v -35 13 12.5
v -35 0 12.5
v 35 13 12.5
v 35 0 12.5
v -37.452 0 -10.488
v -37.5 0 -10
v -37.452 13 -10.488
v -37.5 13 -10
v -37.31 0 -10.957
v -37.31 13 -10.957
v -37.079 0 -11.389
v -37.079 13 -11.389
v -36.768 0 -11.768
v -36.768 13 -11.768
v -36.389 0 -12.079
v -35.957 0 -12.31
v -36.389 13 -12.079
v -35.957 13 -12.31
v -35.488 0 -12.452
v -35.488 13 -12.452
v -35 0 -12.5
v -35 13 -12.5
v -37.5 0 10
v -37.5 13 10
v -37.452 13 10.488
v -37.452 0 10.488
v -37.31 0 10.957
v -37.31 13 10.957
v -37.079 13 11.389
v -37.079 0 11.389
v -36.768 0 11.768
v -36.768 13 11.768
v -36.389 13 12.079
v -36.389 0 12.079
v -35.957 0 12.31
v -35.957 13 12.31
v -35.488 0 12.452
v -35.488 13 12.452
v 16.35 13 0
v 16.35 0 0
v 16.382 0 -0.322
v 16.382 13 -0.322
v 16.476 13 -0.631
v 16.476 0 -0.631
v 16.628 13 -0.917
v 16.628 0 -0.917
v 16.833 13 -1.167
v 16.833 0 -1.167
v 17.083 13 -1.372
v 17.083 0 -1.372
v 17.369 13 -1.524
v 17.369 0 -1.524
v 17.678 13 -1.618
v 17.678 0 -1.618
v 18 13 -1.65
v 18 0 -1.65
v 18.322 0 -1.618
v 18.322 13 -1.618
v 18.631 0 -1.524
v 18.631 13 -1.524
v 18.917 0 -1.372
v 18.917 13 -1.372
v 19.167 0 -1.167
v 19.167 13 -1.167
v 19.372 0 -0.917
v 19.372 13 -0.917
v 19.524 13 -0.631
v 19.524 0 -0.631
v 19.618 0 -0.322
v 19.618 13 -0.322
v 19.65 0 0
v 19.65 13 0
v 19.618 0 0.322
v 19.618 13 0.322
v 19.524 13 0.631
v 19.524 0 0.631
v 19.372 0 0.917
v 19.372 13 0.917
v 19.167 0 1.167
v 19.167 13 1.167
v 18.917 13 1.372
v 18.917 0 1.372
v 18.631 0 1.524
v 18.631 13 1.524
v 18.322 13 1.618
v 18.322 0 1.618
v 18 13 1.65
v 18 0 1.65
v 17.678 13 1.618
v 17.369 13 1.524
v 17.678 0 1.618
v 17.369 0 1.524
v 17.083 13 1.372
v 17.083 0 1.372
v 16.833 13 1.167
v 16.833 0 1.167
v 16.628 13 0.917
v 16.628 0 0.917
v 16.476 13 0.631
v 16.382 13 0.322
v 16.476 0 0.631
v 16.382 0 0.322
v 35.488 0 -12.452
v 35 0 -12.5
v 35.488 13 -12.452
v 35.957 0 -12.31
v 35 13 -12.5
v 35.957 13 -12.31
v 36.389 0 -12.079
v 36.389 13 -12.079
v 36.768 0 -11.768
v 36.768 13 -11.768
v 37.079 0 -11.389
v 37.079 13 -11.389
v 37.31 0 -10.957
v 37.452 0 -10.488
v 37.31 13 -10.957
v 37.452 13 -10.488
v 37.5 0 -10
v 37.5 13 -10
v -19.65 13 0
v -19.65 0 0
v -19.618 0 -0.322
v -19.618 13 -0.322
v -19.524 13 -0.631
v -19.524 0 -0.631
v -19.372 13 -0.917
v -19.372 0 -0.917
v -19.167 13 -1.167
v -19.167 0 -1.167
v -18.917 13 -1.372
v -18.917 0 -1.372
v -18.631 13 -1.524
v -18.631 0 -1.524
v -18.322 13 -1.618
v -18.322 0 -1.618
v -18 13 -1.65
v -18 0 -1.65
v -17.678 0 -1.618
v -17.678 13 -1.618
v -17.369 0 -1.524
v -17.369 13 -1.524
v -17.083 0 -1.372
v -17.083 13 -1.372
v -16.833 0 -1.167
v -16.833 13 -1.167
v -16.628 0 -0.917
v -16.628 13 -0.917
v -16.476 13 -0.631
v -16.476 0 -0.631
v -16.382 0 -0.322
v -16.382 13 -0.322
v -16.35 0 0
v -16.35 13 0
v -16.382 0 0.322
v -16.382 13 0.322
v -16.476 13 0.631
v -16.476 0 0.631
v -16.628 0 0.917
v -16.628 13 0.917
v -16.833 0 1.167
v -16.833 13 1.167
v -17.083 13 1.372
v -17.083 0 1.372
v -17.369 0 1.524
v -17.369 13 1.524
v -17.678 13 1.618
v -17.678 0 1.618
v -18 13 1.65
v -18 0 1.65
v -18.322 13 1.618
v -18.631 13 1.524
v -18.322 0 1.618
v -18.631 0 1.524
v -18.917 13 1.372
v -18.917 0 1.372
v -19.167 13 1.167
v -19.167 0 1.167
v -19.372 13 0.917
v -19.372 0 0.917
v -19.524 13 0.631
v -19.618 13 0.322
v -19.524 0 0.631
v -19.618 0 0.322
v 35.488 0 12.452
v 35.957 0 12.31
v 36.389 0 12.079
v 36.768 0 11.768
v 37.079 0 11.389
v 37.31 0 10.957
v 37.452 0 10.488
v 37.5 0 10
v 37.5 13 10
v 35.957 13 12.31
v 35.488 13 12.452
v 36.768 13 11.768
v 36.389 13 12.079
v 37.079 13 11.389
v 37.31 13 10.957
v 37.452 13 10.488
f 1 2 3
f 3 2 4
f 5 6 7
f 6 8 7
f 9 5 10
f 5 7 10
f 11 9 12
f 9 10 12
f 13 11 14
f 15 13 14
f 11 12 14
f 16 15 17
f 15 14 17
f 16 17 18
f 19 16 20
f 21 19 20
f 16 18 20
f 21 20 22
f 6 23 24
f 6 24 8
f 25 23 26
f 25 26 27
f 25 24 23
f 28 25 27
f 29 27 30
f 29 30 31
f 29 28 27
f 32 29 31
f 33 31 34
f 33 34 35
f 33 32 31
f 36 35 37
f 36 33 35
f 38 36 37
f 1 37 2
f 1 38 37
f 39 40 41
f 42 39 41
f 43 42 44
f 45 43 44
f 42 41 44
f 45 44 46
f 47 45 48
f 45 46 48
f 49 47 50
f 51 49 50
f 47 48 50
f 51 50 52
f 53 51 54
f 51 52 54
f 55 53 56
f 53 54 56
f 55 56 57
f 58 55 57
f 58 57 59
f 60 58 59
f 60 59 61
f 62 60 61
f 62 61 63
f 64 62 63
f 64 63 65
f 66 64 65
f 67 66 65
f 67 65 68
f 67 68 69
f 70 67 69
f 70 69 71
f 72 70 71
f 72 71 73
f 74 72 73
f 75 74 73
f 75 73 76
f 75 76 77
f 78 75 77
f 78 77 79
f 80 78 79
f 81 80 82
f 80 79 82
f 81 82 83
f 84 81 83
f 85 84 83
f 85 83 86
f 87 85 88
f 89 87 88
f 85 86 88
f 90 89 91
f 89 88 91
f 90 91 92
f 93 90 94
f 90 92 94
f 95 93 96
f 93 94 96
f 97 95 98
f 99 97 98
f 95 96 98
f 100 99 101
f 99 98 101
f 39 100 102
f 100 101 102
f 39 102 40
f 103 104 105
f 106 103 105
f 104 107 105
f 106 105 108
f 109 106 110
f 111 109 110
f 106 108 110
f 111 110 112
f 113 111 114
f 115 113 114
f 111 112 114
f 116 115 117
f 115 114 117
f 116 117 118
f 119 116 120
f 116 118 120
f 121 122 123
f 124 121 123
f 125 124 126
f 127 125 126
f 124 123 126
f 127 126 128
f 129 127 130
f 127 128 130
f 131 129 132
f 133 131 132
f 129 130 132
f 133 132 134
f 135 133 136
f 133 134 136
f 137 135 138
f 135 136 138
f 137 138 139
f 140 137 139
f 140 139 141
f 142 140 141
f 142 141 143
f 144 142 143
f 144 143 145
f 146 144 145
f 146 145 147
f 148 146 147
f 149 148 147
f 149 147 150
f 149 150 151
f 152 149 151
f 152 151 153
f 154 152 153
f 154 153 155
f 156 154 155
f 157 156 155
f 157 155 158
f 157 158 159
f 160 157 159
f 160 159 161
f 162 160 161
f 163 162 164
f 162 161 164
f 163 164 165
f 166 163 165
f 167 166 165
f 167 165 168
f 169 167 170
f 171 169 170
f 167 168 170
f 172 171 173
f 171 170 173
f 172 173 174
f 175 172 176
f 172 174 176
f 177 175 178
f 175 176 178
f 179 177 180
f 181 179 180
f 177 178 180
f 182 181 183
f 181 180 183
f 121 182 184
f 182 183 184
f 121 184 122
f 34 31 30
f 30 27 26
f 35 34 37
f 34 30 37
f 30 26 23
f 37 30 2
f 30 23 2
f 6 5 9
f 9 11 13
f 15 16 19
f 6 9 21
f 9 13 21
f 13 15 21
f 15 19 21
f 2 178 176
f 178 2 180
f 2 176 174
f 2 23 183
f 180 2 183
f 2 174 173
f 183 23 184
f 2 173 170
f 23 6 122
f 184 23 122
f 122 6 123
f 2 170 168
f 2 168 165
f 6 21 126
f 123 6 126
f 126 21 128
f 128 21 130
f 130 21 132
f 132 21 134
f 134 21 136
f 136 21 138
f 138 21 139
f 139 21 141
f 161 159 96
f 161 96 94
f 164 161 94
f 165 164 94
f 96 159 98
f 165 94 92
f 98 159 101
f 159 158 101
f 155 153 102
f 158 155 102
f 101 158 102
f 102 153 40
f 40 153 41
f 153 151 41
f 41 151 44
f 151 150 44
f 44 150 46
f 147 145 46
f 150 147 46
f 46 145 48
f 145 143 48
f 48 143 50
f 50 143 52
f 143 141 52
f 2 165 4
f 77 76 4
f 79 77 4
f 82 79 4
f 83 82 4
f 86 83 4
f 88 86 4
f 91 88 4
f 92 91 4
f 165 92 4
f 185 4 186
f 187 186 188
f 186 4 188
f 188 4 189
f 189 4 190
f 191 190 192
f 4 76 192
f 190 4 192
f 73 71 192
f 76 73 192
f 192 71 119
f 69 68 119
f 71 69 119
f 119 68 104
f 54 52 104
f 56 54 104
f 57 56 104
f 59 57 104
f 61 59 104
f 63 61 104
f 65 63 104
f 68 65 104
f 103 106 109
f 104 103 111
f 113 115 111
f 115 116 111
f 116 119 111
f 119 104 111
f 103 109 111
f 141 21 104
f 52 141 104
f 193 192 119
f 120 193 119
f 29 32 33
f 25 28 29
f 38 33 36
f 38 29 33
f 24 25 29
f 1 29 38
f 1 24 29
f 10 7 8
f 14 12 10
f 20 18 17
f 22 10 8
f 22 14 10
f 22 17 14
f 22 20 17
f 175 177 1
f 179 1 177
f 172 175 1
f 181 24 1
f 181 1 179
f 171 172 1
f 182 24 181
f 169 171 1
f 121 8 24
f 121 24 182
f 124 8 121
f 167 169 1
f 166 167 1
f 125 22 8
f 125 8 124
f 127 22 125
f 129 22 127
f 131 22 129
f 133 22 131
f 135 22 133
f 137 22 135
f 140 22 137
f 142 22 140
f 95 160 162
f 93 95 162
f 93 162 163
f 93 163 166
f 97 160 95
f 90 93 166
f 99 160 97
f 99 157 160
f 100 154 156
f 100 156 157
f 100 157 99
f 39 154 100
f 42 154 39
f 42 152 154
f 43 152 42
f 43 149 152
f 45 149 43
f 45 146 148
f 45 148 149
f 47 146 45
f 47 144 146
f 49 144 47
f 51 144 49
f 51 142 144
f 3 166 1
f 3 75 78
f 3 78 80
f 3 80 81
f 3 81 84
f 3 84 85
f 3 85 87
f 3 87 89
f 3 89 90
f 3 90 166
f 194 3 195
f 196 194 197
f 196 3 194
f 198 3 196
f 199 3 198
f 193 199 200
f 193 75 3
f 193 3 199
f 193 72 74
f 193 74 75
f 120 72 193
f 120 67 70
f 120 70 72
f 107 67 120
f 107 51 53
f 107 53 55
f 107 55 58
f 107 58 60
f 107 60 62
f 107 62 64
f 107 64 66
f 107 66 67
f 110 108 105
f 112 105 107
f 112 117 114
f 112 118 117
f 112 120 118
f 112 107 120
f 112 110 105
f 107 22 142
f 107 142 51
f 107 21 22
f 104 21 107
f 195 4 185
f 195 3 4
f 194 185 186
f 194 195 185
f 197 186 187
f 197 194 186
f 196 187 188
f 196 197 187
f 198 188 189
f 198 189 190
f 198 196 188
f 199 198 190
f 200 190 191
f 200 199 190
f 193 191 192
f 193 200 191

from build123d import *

# Parameters (mm, degrees)
SKETCH1_W                   = 75
SKETCH1_H                   = 25
BOSS_EXTRUDE1_DEPTH         = 13
TAP_DRILL_FOR_M4X0_7_TAP1_D = 3.3
FILLET1_R                   = 2.5


with BuildPart() as part:
    # Sketch1 → Boss-Extrude1 (new body)
    with BuildSketch(Plane(origin=(0, 0, 0), x_dir=(1, 0, 0), z_dir=(0, 1, 0))):
        Rectangle(SKETCH1_W, SKETCH1_H)
    extrude(amount=BOSS_EXTRUDE1_DEPTH)

    # Tap Drill for M4x0.7 Tap1 (through all)
    with Locations(Plane(origin=(0, 13, 0), x_dir=(1, 0, 0), z_dir=(0, 1, 0))):
        with Locations((-18, 0), (18, 0)):
            Hole(TAP_DRILL_FOR_M4X0_7_TAP1_D / 2)

    # Fillet1
    fillet1_edges = [part.edges().sort_by_distance(p)[0] for p in [
        (37.5, 6.5, 12.5),
        (-37.5, 6.5, 12.5),
        (-37.5, 6.5, -12.5),
        (37.5, 6.5, -12.5),
    ]]
    fillet(fillet1_edges, radius=FILLET1_R)


solid = part.part
